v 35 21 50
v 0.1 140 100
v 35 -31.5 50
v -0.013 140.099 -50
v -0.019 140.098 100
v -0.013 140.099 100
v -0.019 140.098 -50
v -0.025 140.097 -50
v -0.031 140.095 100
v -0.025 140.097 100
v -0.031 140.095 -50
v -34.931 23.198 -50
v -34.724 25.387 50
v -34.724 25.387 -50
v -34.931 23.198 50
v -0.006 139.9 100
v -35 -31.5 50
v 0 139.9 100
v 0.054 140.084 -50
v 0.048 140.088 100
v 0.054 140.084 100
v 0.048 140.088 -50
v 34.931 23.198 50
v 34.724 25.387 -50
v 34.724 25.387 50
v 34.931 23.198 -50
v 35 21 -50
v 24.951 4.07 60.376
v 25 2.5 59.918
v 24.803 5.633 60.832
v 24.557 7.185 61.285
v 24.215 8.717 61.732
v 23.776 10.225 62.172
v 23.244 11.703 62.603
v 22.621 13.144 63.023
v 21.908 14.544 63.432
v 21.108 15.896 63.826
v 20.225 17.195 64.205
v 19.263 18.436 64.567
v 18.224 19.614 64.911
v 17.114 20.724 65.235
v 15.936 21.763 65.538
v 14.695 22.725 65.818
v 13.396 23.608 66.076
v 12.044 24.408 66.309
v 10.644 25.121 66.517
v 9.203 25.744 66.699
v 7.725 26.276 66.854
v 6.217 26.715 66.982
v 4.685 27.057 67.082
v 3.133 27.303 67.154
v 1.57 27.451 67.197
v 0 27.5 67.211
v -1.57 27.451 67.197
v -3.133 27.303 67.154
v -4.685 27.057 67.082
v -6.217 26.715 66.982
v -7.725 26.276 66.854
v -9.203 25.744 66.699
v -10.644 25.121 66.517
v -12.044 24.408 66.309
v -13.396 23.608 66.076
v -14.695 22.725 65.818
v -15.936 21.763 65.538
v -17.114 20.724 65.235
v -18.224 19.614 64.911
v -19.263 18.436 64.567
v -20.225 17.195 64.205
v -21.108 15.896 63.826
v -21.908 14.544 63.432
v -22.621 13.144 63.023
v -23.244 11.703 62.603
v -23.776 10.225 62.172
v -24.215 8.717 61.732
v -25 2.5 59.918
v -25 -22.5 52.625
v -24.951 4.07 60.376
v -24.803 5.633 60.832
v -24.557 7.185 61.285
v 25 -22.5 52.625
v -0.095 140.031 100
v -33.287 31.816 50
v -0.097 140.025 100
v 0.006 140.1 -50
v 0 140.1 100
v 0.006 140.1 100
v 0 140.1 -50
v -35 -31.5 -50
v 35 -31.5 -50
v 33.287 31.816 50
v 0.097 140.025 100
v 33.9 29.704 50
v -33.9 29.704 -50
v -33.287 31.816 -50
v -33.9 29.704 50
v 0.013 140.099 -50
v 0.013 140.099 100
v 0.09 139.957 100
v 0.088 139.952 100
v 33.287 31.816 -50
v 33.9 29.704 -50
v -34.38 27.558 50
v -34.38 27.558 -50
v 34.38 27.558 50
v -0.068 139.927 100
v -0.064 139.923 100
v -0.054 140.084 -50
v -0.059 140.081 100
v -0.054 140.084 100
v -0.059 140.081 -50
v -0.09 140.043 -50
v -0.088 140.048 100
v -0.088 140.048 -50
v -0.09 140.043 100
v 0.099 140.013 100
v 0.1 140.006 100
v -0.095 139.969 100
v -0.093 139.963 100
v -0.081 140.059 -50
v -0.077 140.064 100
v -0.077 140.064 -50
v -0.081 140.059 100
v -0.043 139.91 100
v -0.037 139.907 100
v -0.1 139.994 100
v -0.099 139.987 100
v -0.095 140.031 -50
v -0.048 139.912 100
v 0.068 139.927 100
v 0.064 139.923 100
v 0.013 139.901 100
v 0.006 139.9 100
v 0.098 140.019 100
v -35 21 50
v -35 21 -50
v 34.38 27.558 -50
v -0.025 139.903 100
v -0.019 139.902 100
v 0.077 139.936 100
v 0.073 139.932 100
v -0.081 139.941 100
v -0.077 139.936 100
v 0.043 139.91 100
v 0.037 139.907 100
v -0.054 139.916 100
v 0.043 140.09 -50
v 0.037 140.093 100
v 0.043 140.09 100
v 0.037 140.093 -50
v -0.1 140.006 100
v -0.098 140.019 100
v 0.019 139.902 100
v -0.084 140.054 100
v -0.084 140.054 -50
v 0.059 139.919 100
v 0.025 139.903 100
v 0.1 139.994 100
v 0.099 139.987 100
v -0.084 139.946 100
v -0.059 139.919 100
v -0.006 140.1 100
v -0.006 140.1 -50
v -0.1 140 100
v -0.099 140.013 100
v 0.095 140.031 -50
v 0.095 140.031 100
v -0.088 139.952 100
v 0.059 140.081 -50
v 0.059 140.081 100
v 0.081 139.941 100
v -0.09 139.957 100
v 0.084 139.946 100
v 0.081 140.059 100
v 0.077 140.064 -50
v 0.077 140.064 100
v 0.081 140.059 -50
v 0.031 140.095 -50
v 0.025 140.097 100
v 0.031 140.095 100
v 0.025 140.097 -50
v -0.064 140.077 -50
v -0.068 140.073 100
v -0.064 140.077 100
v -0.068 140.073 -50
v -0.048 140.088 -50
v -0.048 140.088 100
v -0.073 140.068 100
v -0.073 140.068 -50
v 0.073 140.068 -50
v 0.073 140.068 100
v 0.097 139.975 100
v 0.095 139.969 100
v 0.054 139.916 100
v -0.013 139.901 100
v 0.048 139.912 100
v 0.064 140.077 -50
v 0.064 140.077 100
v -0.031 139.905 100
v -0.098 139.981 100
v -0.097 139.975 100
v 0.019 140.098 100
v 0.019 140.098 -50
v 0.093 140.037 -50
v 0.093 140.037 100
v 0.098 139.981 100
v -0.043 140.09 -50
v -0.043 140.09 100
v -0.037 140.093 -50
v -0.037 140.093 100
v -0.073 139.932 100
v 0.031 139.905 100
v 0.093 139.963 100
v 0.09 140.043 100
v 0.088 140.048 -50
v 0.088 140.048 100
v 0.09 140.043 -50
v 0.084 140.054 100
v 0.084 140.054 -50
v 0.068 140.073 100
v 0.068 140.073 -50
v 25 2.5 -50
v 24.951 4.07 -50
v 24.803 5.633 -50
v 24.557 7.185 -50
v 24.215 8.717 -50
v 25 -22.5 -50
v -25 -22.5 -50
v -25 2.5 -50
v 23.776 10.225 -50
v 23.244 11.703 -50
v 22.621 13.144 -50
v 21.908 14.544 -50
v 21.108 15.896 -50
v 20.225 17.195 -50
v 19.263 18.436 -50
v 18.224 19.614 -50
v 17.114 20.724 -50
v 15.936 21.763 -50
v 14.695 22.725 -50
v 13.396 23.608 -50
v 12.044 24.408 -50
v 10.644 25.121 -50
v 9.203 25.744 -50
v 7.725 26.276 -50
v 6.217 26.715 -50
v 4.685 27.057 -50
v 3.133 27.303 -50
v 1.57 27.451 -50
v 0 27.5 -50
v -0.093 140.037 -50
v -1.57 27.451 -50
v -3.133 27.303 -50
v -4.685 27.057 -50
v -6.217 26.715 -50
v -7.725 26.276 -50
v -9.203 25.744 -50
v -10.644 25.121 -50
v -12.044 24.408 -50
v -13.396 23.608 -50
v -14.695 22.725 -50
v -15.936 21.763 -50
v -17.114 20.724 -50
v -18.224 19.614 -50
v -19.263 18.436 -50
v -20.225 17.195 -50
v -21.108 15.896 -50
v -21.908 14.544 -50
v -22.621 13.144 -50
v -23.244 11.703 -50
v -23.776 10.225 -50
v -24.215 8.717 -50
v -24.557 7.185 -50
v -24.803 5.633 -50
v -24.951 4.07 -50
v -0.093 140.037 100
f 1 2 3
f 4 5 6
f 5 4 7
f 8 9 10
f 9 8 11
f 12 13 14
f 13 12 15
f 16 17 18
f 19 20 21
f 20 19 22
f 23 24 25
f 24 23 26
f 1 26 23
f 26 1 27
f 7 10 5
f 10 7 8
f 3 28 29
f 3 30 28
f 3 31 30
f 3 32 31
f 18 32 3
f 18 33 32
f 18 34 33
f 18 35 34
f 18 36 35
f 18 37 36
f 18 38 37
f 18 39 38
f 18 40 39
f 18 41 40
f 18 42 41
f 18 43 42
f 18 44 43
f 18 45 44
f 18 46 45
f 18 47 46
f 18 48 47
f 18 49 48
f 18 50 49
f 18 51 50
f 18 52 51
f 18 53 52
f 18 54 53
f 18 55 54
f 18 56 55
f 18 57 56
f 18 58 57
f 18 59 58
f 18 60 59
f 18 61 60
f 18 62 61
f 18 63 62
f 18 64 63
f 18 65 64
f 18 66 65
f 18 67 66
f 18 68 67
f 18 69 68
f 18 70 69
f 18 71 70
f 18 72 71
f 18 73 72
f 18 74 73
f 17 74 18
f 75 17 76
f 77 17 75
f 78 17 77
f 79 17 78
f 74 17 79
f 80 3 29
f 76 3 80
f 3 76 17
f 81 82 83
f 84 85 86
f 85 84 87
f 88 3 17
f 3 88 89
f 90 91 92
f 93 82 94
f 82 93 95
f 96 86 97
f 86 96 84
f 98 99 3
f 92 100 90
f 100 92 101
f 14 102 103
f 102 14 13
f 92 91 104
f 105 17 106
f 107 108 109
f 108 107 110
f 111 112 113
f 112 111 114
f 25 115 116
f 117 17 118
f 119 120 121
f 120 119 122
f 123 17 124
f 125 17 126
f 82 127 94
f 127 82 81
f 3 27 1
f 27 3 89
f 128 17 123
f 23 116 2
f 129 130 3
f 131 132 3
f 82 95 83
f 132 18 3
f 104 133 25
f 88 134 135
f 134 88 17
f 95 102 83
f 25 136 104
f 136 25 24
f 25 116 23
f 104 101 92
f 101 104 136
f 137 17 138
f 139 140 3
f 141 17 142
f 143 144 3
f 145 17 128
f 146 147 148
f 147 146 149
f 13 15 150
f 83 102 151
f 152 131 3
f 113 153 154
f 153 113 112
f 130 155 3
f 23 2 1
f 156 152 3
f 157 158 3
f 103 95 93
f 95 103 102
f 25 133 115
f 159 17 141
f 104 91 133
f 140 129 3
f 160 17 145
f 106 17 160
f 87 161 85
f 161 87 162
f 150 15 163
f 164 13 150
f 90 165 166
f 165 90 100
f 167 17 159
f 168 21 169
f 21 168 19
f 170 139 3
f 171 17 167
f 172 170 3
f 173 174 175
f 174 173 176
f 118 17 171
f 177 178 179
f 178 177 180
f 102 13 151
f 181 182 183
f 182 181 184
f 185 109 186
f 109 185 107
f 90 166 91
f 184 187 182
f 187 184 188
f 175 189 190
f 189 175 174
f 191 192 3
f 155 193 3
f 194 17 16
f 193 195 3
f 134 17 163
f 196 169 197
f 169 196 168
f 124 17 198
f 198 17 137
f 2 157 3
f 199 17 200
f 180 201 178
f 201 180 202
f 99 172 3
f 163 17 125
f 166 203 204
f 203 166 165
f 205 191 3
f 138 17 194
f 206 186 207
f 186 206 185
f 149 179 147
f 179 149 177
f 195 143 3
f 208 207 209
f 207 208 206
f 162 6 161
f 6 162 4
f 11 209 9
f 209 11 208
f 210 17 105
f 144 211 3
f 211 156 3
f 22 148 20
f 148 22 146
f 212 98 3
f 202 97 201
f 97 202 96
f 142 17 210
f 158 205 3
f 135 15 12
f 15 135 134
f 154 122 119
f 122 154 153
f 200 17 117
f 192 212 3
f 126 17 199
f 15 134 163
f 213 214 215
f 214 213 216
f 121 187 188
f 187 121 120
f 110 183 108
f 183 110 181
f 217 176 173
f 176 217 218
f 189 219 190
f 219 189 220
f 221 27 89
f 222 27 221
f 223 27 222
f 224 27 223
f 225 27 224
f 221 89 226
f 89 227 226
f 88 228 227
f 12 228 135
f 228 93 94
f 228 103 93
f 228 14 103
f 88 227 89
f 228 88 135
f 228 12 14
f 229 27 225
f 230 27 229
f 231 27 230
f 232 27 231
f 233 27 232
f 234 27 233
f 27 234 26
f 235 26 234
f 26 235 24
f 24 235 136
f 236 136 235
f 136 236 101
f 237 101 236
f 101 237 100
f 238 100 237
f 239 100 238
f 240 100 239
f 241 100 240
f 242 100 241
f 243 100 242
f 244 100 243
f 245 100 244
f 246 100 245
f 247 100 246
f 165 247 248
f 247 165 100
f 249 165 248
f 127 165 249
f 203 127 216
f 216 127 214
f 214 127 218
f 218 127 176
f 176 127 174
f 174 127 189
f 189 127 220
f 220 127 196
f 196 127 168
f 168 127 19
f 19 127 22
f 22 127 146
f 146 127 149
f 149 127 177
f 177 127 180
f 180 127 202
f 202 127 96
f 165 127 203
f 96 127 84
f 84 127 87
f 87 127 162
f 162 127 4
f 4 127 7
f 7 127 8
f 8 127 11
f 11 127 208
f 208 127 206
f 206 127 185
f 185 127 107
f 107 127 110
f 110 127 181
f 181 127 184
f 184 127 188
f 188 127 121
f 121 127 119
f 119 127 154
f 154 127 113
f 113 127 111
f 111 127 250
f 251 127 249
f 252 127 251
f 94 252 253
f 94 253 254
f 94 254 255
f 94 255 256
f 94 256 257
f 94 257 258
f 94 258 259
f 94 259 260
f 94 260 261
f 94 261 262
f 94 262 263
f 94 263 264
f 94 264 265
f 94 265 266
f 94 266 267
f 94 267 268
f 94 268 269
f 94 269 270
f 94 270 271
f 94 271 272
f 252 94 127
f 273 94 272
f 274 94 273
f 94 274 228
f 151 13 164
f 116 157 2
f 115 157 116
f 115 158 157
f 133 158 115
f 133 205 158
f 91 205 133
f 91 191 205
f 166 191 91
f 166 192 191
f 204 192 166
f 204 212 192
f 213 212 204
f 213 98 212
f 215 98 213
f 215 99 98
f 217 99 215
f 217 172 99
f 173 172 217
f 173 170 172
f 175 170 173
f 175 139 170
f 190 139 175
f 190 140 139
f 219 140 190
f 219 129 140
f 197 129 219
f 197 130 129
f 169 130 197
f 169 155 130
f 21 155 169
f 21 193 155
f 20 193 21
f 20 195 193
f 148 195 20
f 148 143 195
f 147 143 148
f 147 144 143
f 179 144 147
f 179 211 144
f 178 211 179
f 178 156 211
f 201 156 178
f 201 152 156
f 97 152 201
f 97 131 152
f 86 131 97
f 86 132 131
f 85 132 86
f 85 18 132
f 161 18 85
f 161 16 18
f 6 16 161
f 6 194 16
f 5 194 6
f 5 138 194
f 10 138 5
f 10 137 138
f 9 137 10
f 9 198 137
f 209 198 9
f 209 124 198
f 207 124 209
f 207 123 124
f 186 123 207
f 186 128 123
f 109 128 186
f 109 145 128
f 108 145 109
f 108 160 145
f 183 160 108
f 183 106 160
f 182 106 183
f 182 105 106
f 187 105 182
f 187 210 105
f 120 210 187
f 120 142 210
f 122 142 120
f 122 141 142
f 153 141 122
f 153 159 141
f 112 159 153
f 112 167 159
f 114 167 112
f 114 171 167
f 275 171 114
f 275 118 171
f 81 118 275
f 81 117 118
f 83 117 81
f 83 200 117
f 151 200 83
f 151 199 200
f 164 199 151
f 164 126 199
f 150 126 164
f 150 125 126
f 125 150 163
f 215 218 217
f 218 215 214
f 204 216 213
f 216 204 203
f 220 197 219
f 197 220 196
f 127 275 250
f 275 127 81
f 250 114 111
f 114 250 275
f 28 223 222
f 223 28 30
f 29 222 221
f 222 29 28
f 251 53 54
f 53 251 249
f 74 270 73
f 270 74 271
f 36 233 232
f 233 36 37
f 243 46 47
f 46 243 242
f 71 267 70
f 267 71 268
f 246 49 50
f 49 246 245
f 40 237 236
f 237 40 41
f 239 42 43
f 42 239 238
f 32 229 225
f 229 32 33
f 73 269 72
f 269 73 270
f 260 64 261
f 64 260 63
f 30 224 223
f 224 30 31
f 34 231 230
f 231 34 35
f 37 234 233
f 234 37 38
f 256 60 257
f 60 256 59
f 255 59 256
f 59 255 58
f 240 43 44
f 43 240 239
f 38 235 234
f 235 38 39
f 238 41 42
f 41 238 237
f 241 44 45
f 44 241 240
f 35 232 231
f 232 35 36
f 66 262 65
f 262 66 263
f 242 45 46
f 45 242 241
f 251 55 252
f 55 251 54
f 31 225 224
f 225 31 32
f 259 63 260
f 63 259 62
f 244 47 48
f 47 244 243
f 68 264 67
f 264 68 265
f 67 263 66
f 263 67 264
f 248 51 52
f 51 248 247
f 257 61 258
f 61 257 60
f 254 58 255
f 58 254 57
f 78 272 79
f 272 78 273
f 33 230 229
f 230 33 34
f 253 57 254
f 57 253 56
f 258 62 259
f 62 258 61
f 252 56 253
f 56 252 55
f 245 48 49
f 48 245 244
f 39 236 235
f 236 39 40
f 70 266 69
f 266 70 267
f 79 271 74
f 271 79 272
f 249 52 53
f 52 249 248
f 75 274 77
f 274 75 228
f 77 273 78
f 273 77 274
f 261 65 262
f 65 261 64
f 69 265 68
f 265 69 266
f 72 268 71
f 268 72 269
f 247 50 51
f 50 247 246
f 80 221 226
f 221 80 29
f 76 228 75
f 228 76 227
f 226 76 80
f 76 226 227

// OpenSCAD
// [FL_INDEX: keywords="openscad, 3d_parametric, Libre_axe_head_v1, csg_solid" | COT="Parametric OpenSCAD design from 3DCodeverse"]
// Title: Libre axe head v1

// Customizable simple axe head

//Customizer Variables

//axe head back
r= 70; //[1:200]

//resolution
n=100; //[1:200]

//axe head height
h=100; //[1:500]

// handle hole radius
x=25; // 

//scale
s=140; //

// blade lip
l=50;//

// roundness
a=20;//

module chuck(){
	union(){
translate([0,-0.1*r,0])cube([r,0.7*r,h], center = true);
translate([0,0.6*r/2,0])cylinder(h = h, r1 = r/2, r2 = r/2, center = true, $fn=n);
}
}

module chunk(){
hull(){
chuck();
translate([0,s,l/2])cylinder(h = h+l, r1 = 0.1, r2 = 0.1, center = true, $fn=n);
				}
}

module axehead(){
	difference(){
	chunk();	
	translate([0,x*.1,0])cylinder(h = h+l+1, r1 = x, r2 = x, center = true, $fn=n);
	translate([-x,-x*.9,-h/2-1])cube([2*x, x,h+l+1,]);
	}
					}
axehead();
